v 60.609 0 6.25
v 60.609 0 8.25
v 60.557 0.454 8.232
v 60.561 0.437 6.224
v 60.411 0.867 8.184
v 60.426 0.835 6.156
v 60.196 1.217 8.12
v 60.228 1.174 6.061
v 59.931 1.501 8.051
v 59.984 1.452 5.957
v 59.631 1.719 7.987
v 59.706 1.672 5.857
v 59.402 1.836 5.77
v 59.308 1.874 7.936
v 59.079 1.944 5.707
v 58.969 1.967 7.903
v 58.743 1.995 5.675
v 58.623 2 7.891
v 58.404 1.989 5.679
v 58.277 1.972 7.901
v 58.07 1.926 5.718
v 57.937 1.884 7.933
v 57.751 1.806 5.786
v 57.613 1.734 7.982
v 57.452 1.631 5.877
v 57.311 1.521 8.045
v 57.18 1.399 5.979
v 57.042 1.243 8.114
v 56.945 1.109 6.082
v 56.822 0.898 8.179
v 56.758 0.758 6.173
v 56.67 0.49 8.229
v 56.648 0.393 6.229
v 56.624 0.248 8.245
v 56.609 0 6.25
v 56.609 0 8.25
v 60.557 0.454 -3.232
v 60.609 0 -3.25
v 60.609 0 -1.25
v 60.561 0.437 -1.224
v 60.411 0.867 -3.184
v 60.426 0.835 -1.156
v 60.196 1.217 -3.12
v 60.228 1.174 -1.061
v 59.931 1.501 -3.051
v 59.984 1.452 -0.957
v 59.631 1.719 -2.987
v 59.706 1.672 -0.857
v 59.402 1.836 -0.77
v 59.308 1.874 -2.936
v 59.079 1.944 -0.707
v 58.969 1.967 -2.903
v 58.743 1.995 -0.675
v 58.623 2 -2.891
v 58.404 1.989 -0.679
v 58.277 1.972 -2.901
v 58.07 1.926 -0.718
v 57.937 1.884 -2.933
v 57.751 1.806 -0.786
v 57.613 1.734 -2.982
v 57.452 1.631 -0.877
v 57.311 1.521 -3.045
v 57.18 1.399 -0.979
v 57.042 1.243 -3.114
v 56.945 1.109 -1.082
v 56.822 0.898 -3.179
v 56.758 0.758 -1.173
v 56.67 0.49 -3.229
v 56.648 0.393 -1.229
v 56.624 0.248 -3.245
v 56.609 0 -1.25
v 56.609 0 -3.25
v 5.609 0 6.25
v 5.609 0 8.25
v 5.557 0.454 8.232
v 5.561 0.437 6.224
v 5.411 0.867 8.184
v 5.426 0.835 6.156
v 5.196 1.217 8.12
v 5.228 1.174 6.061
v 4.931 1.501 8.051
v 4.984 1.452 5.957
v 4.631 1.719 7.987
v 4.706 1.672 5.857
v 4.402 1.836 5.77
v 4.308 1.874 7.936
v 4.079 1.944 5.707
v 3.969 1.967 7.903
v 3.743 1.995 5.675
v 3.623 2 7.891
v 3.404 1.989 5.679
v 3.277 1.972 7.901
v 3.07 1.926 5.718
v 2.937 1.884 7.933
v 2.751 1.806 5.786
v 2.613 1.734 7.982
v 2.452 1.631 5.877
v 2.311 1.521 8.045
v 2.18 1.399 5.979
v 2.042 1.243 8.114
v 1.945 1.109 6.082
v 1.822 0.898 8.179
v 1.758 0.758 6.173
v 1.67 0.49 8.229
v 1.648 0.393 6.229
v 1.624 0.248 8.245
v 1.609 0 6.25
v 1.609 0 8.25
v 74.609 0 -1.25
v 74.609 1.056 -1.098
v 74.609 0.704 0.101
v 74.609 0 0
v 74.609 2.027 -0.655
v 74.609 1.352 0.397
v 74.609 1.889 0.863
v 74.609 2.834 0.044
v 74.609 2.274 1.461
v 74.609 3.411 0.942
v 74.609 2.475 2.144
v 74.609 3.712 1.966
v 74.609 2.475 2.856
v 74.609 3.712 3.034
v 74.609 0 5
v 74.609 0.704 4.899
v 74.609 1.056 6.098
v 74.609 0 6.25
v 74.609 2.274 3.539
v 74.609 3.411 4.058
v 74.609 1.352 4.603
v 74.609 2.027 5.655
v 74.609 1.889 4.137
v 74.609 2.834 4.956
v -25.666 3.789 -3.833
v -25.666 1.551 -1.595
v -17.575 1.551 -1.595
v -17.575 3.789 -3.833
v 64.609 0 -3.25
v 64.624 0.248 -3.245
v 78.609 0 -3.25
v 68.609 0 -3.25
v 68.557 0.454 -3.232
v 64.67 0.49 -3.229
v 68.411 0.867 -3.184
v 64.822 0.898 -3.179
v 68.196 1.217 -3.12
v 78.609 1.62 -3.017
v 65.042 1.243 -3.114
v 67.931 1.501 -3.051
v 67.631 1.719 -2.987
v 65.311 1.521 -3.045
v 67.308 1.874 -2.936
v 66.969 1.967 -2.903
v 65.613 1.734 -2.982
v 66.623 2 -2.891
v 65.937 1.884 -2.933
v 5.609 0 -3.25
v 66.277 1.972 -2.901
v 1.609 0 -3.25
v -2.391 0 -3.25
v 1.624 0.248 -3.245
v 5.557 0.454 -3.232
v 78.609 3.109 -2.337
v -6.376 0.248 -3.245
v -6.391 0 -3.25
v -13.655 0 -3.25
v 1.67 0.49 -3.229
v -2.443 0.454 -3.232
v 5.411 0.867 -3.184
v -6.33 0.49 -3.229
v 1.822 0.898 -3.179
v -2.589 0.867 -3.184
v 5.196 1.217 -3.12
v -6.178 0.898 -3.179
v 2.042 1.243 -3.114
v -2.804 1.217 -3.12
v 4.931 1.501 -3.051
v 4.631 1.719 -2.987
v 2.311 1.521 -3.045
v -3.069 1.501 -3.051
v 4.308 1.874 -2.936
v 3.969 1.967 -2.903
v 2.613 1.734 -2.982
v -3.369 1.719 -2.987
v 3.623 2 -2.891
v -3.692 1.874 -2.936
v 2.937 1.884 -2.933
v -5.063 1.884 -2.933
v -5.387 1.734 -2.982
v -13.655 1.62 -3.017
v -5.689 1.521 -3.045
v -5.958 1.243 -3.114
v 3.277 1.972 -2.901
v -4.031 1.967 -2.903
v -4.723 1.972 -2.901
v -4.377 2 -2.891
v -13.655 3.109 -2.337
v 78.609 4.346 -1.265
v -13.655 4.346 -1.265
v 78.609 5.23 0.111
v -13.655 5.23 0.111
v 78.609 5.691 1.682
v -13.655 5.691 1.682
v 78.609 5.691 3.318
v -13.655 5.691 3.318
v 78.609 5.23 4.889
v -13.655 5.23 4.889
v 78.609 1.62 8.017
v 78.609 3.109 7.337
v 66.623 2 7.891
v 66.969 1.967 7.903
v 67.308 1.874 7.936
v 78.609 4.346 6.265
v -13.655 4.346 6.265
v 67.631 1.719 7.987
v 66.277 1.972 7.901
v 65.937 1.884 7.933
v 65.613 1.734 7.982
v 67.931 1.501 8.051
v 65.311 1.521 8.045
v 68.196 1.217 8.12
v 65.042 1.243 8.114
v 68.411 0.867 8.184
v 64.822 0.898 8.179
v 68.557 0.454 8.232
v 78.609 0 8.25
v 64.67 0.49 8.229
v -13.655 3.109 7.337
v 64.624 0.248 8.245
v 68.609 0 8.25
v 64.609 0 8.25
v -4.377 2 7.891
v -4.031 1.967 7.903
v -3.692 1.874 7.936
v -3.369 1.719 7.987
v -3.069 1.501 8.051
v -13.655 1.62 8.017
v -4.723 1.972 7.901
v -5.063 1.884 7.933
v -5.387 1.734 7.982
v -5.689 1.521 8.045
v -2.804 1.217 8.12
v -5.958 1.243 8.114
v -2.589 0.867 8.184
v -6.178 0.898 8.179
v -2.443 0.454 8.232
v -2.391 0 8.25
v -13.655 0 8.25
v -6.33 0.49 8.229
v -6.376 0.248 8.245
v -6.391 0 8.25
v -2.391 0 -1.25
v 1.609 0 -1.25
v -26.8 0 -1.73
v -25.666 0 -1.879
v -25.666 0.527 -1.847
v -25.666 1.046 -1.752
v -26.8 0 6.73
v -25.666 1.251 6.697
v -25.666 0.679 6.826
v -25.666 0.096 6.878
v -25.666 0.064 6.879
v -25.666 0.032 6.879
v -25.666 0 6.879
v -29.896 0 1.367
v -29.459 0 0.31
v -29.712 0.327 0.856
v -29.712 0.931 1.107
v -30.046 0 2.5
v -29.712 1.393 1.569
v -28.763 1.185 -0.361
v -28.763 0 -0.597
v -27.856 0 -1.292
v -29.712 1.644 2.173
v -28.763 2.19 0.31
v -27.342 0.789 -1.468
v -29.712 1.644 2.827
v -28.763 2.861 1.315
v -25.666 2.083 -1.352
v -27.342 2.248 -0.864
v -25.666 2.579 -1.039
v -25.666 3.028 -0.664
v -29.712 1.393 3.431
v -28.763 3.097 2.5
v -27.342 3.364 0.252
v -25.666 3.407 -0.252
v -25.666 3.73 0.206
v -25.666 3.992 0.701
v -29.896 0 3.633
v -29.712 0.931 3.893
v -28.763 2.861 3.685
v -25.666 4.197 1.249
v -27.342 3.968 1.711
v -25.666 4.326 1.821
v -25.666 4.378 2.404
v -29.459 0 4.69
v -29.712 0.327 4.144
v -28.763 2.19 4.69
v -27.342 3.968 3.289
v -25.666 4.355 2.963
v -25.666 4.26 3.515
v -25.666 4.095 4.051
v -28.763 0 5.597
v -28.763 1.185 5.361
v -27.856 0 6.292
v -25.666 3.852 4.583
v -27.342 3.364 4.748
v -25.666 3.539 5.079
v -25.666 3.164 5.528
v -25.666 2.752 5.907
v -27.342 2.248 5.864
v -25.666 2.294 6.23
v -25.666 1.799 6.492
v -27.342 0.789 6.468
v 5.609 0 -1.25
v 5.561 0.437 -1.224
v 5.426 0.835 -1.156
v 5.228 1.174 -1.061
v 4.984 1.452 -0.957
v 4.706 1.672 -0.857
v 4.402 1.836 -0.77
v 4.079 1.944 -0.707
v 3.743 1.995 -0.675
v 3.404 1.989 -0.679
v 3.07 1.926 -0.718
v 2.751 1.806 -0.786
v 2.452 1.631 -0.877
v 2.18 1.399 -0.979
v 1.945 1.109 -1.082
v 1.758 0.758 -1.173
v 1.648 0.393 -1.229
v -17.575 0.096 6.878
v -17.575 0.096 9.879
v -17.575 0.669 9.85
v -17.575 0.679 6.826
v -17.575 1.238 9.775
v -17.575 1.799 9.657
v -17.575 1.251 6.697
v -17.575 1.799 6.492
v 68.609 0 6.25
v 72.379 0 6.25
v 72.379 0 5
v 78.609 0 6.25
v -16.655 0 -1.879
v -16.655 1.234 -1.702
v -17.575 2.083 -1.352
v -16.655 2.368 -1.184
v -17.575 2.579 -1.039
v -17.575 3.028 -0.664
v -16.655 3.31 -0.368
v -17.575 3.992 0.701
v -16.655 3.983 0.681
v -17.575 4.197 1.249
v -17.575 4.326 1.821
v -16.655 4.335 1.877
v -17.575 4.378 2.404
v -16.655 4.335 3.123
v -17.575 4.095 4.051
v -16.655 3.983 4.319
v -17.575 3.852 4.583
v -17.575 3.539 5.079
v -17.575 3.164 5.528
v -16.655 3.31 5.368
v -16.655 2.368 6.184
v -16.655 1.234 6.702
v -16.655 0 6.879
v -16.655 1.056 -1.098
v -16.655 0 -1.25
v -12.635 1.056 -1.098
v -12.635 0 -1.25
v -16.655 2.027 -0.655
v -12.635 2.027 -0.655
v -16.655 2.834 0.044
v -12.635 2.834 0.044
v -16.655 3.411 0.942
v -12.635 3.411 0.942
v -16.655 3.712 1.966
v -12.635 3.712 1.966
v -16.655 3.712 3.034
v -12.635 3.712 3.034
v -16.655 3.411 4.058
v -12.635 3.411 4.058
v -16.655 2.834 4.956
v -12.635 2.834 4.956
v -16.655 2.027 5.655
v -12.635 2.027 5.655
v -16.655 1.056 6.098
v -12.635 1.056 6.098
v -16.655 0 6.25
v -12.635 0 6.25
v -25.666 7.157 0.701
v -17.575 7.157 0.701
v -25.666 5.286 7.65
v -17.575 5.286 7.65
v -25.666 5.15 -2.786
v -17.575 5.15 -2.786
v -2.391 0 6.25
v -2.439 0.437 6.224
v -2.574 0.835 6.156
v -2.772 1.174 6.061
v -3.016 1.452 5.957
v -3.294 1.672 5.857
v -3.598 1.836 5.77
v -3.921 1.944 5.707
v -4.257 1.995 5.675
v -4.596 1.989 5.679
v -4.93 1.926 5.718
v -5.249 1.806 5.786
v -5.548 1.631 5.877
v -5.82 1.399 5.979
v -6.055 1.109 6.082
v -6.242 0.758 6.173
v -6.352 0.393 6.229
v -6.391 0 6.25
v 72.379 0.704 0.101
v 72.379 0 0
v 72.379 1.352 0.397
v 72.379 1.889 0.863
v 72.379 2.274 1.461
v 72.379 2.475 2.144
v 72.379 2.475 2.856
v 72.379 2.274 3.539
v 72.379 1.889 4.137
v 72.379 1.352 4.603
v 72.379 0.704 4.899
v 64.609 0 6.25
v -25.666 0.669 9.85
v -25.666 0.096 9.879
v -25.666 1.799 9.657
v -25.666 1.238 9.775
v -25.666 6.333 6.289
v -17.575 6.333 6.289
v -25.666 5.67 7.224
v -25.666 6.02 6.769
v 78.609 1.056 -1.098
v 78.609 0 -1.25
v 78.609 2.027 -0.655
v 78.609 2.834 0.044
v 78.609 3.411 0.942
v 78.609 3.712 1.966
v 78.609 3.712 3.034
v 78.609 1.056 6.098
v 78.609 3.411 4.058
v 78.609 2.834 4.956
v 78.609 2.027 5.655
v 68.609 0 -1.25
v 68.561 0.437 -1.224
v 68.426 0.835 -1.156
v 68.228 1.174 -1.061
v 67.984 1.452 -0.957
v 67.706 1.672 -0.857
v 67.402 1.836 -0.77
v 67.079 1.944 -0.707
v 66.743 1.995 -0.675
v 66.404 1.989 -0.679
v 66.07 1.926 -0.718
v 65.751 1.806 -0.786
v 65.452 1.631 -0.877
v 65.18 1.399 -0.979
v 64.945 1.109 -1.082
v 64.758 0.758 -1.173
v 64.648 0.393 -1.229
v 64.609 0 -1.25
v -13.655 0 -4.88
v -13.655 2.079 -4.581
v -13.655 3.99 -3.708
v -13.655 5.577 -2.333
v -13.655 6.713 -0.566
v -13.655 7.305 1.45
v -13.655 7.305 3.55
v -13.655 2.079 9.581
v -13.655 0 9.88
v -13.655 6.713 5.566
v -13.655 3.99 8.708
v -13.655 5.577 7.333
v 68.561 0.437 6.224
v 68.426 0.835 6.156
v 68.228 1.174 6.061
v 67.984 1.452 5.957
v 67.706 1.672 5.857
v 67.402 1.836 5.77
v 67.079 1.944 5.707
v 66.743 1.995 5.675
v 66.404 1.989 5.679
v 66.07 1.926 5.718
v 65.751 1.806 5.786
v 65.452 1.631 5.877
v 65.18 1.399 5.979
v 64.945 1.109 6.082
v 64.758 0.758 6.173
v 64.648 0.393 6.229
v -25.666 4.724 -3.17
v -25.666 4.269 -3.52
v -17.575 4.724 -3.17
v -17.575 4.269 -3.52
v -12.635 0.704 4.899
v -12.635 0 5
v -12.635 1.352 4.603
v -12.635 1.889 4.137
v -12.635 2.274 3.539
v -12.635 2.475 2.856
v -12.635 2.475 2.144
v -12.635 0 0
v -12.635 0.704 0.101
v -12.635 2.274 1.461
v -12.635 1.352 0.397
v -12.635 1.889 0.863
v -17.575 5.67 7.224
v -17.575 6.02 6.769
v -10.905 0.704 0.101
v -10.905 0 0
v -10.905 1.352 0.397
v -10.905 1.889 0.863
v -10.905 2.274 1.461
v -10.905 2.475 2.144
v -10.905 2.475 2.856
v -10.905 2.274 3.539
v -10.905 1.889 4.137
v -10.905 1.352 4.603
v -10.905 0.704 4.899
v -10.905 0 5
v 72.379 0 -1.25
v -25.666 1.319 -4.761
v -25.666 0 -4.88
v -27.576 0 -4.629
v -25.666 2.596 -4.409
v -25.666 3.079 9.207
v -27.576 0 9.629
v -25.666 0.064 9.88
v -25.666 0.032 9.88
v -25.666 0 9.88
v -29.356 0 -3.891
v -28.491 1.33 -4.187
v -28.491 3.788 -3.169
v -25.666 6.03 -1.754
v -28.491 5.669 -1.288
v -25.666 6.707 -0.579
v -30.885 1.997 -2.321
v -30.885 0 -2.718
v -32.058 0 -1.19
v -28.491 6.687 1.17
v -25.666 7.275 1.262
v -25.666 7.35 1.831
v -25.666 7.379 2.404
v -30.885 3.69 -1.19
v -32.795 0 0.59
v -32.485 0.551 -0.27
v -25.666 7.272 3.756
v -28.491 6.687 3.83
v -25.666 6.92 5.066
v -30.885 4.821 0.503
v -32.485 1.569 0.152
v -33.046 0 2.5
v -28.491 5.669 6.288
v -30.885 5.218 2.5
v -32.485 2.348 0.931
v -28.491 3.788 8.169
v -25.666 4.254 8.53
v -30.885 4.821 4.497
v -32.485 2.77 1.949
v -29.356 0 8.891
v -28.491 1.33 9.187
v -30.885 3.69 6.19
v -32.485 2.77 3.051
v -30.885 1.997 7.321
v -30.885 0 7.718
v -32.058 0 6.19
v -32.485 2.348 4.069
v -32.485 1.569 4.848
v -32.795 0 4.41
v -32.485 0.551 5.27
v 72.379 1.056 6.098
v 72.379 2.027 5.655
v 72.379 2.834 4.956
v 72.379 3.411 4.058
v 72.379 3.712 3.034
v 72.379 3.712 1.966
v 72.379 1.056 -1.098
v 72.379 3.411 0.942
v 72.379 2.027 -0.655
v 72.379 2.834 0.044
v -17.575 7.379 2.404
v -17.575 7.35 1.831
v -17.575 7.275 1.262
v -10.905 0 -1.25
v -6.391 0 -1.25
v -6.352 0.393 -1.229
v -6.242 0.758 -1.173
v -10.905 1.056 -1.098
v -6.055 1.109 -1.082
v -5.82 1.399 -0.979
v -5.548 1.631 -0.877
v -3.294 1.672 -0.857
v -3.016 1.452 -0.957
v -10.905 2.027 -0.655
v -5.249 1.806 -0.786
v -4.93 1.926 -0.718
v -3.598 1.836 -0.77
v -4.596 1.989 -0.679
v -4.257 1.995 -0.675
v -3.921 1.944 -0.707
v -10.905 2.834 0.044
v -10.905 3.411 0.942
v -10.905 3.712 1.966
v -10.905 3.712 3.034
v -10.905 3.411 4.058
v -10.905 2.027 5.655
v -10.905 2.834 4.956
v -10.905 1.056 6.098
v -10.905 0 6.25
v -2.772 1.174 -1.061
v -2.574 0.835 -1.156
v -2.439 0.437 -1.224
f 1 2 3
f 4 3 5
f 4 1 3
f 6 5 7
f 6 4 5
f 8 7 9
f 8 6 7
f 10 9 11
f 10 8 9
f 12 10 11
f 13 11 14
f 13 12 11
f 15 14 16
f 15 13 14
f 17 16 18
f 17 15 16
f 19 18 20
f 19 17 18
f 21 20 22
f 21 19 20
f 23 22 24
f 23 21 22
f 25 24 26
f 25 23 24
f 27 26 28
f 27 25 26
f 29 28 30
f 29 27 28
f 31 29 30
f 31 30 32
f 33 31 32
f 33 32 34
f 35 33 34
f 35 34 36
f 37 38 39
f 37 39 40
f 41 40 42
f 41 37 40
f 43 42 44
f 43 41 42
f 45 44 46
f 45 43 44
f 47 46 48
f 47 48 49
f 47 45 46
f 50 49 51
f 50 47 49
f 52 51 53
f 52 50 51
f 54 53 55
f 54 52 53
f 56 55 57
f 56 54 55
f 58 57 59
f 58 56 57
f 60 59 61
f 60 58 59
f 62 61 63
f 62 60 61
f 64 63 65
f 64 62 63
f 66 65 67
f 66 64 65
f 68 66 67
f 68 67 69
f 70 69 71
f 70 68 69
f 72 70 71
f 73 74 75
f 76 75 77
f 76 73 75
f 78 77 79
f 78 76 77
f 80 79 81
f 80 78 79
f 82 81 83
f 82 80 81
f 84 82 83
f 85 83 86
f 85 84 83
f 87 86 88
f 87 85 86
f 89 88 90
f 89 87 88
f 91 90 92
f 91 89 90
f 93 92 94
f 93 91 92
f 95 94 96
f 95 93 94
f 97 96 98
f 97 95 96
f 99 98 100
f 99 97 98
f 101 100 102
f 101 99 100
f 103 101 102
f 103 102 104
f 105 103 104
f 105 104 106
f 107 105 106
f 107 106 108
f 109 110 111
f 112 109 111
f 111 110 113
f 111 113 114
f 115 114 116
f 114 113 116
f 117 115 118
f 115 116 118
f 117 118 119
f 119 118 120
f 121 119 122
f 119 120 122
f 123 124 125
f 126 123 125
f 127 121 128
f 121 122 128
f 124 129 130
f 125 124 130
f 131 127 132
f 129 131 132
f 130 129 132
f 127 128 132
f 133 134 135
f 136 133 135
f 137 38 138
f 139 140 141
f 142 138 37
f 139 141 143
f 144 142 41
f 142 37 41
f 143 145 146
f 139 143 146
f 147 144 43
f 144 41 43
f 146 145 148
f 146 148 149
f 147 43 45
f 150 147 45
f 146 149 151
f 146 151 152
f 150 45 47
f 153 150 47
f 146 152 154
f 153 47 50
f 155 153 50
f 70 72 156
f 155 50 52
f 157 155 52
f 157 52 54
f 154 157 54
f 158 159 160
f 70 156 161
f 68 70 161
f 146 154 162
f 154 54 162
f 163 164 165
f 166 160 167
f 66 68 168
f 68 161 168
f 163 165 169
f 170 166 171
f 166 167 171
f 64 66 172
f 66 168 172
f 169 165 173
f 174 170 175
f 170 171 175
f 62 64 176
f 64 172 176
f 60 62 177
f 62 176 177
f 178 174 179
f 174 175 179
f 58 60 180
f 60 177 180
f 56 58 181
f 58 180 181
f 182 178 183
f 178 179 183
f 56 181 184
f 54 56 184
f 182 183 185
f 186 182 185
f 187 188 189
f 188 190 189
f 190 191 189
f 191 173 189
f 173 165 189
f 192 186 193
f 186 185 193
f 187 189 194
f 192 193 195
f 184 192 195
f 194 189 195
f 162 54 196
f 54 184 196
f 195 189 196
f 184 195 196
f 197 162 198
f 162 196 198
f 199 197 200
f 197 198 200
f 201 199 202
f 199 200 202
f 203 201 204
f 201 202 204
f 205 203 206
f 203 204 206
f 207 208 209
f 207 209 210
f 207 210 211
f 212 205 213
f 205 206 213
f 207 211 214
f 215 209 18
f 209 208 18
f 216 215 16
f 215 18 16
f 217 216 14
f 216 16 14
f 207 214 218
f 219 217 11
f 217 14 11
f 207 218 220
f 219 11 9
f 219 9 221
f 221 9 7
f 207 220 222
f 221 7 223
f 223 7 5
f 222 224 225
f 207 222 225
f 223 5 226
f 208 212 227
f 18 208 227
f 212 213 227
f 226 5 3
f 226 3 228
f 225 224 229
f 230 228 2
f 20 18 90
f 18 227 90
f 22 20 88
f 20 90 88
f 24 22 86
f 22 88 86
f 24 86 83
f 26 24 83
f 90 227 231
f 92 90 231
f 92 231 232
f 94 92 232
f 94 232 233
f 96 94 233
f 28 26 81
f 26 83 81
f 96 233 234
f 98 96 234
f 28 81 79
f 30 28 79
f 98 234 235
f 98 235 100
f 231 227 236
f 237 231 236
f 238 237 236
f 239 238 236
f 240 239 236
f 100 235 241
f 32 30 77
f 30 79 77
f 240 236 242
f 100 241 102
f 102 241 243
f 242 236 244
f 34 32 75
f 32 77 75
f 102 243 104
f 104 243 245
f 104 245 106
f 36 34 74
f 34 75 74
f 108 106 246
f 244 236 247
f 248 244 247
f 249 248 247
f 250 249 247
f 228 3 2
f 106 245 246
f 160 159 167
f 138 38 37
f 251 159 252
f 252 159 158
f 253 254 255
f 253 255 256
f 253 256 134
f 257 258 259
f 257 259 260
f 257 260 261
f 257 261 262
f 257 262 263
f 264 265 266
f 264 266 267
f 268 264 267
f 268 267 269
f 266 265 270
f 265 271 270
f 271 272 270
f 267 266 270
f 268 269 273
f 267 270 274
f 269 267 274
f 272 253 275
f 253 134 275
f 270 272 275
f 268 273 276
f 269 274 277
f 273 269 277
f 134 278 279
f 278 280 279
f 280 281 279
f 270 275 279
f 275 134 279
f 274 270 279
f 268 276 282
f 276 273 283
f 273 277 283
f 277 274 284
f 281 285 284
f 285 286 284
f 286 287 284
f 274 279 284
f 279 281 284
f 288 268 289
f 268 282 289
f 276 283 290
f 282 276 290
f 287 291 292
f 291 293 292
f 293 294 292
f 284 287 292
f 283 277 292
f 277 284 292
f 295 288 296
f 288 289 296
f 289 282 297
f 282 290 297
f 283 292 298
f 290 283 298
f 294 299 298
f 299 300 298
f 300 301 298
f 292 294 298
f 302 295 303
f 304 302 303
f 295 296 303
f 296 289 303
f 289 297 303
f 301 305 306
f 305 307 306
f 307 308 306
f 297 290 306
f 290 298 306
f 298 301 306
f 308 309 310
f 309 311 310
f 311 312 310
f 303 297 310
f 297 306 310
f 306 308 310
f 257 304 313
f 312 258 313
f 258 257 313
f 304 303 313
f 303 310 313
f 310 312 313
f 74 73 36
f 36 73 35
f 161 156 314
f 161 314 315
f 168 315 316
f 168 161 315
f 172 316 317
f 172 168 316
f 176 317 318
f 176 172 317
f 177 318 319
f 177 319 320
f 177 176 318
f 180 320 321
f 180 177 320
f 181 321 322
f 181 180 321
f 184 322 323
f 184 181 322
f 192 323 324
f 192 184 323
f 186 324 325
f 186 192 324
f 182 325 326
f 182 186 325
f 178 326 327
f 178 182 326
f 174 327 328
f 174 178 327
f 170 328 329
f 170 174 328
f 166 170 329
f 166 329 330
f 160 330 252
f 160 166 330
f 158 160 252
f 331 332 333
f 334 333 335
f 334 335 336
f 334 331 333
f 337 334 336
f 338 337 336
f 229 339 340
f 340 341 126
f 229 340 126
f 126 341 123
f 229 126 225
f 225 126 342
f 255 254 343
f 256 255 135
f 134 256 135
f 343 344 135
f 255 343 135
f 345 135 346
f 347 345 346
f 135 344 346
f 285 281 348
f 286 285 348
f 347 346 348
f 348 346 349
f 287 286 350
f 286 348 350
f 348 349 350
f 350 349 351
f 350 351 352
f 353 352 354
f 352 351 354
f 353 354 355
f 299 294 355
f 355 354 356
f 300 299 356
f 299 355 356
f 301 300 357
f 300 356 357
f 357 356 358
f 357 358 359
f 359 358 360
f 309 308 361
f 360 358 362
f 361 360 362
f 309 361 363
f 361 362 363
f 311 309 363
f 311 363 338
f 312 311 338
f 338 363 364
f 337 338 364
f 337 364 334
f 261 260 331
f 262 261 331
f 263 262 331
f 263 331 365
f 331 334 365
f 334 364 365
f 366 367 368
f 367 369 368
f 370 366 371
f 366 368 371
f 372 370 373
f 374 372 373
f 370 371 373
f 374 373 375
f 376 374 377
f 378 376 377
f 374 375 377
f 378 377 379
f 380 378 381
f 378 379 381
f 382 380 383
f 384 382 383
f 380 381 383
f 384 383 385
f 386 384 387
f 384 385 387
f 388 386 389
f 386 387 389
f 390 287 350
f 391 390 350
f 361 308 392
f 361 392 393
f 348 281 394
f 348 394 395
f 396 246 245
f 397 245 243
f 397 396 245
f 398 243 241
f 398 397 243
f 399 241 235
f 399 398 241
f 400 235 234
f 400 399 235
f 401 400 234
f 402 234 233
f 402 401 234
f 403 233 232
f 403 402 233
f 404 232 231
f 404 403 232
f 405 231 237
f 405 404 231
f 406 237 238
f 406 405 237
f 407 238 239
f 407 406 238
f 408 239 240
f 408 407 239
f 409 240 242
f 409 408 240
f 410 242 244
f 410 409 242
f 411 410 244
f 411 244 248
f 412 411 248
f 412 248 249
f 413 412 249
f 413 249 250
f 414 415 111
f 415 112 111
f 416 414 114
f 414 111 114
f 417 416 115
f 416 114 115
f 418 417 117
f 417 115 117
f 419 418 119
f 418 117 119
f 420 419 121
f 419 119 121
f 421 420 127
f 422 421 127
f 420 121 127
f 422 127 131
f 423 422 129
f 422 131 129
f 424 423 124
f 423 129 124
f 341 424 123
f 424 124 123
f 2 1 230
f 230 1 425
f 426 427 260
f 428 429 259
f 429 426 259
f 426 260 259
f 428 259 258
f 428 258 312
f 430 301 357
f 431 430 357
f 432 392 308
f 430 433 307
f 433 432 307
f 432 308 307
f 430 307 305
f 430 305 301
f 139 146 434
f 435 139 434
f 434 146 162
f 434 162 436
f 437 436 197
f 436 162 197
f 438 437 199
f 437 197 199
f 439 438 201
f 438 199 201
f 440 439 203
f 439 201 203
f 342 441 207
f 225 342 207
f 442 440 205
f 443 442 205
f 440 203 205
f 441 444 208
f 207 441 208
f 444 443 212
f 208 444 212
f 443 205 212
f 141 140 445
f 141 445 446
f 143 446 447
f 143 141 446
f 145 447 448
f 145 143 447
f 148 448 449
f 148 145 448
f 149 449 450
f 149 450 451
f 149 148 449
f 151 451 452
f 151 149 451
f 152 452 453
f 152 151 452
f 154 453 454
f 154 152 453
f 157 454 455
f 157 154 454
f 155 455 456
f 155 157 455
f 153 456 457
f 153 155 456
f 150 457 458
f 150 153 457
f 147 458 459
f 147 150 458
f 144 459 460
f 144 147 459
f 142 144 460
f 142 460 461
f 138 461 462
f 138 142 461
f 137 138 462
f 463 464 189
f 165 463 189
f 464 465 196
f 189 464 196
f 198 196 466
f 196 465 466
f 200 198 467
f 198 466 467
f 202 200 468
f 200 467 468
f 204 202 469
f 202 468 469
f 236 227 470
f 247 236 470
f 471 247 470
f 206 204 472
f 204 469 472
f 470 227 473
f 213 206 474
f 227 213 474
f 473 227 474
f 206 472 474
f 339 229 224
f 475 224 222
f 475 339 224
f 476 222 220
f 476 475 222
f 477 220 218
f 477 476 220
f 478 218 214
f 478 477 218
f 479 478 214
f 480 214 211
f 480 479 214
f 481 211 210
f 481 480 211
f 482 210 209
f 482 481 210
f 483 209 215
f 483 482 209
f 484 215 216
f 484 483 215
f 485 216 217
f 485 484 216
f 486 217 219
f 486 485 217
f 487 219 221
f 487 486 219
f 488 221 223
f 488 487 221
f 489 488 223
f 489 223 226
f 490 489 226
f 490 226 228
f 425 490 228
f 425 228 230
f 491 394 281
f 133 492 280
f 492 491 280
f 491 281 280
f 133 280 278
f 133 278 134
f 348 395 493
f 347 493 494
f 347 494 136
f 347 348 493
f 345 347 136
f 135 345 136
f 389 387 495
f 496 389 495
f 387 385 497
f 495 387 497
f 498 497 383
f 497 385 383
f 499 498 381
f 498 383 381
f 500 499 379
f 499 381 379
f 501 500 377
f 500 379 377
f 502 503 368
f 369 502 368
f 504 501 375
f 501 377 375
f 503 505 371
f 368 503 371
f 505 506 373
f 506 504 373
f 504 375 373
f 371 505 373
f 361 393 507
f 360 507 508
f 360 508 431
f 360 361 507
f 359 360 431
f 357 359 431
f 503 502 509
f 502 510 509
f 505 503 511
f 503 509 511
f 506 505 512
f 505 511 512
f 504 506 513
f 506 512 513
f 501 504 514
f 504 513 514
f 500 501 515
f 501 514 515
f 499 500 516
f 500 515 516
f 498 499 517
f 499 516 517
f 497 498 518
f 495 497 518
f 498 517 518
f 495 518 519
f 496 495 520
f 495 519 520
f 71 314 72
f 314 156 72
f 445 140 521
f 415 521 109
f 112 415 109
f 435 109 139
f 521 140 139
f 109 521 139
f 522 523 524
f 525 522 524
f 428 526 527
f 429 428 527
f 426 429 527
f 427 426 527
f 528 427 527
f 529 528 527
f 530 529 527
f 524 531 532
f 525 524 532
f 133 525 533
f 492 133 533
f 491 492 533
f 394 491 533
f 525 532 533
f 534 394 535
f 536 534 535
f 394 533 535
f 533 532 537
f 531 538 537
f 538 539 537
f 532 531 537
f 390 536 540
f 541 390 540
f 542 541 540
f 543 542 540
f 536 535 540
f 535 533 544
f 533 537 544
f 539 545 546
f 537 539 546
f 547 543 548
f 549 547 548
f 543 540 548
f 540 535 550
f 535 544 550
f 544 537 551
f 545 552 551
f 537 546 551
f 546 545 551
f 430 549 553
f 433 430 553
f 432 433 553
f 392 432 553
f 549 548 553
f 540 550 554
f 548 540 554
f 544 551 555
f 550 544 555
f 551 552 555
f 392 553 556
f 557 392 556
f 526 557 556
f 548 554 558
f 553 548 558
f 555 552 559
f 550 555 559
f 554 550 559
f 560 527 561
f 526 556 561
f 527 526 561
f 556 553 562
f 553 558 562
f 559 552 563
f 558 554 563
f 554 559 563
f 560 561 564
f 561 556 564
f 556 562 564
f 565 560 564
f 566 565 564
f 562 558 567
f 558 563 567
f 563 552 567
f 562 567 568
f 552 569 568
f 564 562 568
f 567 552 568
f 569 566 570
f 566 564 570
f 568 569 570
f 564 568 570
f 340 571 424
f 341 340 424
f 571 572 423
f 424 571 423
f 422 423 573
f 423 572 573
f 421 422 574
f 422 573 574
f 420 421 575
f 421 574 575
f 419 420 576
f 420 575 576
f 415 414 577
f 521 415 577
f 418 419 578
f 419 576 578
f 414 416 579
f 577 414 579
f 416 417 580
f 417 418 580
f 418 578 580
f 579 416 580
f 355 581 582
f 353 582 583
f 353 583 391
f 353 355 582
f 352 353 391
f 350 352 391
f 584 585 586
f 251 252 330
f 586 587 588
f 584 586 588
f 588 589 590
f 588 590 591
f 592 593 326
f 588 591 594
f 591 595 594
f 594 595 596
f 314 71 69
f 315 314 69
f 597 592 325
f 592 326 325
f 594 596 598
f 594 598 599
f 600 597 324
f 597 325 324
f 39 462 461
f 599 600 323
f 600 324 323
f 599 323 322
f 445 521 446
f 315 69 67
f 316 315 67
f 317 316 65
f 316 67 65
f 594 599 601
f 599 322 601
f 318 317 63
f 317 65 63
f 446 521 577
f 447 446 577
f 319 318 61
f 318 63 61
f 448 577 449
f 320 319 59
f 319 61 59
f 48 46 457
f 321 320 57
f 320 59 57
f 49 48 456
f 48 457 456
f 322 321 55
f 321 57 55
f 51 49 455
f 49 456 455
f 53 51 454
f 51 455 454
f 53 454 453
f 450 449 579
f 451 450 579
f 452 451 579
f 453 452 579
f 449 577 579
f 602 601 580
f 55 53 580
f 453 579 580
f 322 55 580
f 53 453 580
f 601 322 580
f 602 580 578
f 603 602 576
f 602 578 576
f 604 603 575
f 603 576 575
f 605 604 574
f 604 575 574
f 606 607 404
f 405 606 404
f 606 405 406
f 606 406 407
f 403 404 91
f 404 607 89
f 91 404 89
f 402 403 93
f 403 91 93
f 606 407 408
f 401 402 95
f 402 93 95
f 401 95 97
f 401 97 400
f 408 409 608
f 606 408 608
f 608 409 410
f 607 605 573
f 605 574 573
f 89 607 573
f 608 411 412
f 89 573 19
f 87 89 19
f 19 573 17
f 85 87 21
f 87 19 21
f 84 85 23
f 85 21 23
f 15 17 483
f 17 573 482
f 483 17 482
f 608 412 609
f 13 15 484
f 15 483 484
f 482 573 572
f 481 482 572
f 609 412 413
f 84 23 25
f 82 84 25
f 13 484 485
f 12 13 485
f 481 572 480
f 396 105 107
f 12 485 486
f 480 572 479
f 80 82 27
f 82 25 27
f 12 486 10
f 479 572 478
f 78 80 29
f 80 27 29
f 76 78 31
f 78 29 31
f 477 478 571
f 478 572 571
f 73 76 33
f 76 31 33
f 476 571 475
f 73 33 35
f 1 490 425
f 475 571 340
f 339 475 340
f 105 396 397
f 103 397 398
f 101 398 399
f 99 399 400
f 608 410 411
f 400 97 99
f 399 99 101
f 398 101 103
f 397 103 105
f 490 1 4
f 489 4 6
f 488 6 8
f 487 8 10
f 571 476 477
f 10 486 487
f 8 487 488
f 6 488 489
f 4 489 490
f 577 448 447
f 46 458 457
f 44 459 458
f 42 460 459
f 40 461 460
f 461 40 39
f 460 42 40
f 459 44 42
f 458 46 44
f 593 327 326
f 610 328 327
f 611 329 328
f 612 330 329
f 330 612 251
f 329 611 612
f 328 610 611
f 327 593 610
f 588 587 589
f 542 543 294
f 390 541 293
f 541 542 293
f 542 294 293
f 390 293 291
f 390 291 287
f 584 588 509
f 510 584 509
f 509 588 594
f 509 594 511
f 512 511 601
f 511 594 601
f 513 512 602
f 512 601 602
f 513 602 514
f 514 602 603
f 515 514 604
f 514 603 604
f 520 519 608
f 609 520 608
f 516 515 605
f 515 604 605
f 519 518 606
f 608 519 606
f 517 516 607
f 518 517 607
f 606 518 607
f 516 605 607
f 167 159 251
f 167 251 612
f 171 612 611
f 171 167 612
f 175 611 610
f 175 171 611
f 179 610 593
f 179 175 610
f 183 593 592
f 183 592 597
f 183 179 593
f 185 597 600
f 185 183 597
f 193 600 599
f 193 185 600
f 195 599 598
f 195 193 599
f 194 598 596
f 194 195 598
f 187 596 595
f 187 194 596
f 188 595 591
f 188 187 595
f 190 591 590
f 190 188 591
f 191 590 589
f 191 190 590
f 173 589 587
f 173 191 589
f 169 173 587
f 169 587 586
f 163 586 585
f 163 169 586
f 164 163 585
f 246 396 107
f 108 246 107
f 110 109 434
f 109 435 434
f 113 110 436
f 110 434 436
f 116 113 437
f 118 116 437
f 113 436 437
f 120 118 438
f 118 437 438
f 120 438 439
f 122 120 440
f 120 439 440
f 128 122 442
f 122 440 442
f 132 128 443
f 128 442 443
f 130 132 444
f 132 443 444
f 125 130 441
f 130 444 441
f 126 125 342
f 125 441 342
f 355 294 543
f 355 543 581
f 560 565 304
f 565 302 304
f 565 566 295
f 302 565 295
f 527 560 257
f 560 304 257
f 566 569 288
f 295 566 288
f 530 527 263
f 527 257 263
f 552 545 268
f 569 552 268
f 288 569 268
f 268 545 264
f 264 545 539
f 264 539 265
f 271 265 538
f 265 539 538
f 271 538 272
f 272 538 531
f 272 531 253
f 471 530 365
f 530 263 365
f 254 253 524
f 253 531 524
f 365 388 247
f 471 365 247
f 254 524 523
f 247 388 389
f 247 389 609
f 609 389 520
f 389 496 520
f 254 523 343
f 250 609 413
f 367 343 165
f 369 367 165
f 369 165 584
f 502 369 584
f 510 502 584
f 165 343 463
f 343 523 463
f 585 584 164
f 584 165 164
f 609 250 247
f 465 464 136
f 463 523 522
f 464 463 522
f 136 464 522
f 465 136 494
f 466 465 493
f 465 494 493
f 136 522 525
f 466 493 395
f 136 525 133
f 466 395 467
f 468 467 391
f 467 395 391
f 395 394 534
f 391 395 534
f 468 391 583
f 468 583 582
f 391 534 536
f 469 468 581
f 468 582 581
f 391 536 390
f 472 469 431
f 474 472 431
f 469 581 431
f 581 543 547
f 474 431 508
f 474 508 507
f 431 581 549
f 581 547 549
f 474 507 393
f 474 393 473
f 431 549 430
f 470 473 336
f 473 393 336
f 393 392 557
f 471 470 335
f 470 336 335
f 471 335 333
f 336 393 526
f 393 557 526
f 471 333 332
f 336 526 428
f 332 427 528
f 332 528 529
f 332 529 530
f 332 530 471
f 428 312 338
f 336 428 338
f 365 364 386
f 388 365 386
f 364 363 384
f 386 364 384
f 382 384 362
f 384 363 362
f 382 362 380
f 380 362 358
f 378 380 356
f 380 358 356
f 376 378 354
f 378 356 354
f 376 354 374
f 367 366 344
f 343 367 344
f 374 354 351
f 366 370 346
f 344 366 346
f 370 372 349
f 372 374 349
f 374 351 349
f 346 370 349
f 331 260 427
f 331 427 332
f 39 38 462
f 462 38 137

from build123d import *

# Parameters (mm, degrees)
REVOLVE6_ANGLE          = 180
SKETCH2_W               = 8.091492299
SKETCH2_H               = 1.703338147
CUT_EXTRUDE1_DEPTH      = 10
CIRPATTERN1_COUNT       = 8
CUT_EXTRUDE4_DEPTH      = 80.570407996
CUT_EXTRUDE4_DEPTH_BACK = 80.570407996
SKETCH3_R               = 2


with BuildPart() as part:
    # Sketch1 → Revolve6 (revolve)
    with BuildSketch(Plane(origin=(0, 0, 0), x_dir=(1, 0, 0), z_dir=(0, 1, 0))):
        with BuildLine():
            Line((-7.909078058, 1.25), (72.378975497, 1.25))
            Line((72.378975497, 1.25), (72.378975497, 0))
            Line((72.378975497, 0), (74.608975497, 0))
            Line((74.608975497, 0), (74.608975497, 1.25))
            Line((74.608975497, 1.25), (78.608975497, 1.25))
            Line((78.608975497, 1.25), (78.608975497, 3.25))
            Line((78.608975497, 3.25), (74.913959146, 3.25))
            Line((74.913959146, 3.25), (-13.655190787, 3.25))
            Line((-13.655190787, 3.25), (-13.655190787, 4.88))
            Line((-13.655190787, 4.88), (-16.655190787, 4.88))
            Line((-16.655190787, 4.88), (-25.666337235, 4.88))
            ThreePointArc((-25.666337235, 4.88), (-30.88478528, 2.718448045), (-33.046337235, -2.5))
            Line((-33.046337235, -2.5), (-30.045517155, -2.5))
            ThreePointArc((-30.045517155, -2.5), (-28.762885052, 0.596547817), (-25.666337235, 1.87917992))
            Line((-25.666337235, 1.87917992), (-16.655190787, 1.87917992))
            Line((-16.655190787, 1.87917992), (-16.655190787, 1.25))
            Line((-16.655190787, 1.25), (-12.635190787, 1.25))
            Line((-12.635190787, 1.25), (-12.635190787, 0))
            Line((-12.635190787, 0), (-10.905190787, 0))
            Line((-10.905190787, 0), (-10.905190787, 1.25))
            Line((-10.905190787, 1.25), (-7.909078058, 1.25))
        make_face()
    revolve(axis=Axis((-33.046337235, 0, 2.5), (1, 0, 0)), revolution_arc=REVOLVE6_ANGLE)

    # Sketch2 → Cut-Extrude1 (cut)
    with BuildSketch(Plane(origin=(0, 0, 0), x_dir=(1, 0, 0), z_dir=(0, 1, 0))):
        with Locations((-21.620591086, -1.552211442)):
            Rectangle(SKETCH2_W, SKETCH2_H)
    cut_extrude1 = extrude(amount=CUT_EXTRUDE1_DEPTH, mode=Mode.SUBTRACT)

    # CirPattern1: Cut-Extrude1 ×8 about axis
    cirpattern1_axis = Axis((0, 0, 2.5), (1, 0, 0))
    for i in range(1, CIRPATTERN1_COUNT):
        add(cut_extrude1.rotate(cirpattern1_axis, i * 360 / CIRPATTERN1_COUNT), mode=Mode.SUBTRACT)

    # Sketch3 → Cut-Extrude4 (cut, two sides: drawn at the far end of the back side and taken through both)
    with BuildSketch(Plane.XY.offset(-CUT_EXTRUDE4_DEPTH_BACK)):
        with Locations((66.608975497, 0)):
            Circle(SKETCH3_R)
        with Locations((58.608975497, 0)):
            Circle(SKETCH3_R)
        with Locations((3.608975497, 0)):
            Circle(SKETCH3_R)
        with Locations((-4.391024503, 0)):
            Circle(SKETCH3_R)
    extrude(amount=CUT_EXTRUDE4_DEPTH + CUT_EXTRUDE4_DEPTH_BACK, mode=Mode.SUBTRACT)


solid = part.part
